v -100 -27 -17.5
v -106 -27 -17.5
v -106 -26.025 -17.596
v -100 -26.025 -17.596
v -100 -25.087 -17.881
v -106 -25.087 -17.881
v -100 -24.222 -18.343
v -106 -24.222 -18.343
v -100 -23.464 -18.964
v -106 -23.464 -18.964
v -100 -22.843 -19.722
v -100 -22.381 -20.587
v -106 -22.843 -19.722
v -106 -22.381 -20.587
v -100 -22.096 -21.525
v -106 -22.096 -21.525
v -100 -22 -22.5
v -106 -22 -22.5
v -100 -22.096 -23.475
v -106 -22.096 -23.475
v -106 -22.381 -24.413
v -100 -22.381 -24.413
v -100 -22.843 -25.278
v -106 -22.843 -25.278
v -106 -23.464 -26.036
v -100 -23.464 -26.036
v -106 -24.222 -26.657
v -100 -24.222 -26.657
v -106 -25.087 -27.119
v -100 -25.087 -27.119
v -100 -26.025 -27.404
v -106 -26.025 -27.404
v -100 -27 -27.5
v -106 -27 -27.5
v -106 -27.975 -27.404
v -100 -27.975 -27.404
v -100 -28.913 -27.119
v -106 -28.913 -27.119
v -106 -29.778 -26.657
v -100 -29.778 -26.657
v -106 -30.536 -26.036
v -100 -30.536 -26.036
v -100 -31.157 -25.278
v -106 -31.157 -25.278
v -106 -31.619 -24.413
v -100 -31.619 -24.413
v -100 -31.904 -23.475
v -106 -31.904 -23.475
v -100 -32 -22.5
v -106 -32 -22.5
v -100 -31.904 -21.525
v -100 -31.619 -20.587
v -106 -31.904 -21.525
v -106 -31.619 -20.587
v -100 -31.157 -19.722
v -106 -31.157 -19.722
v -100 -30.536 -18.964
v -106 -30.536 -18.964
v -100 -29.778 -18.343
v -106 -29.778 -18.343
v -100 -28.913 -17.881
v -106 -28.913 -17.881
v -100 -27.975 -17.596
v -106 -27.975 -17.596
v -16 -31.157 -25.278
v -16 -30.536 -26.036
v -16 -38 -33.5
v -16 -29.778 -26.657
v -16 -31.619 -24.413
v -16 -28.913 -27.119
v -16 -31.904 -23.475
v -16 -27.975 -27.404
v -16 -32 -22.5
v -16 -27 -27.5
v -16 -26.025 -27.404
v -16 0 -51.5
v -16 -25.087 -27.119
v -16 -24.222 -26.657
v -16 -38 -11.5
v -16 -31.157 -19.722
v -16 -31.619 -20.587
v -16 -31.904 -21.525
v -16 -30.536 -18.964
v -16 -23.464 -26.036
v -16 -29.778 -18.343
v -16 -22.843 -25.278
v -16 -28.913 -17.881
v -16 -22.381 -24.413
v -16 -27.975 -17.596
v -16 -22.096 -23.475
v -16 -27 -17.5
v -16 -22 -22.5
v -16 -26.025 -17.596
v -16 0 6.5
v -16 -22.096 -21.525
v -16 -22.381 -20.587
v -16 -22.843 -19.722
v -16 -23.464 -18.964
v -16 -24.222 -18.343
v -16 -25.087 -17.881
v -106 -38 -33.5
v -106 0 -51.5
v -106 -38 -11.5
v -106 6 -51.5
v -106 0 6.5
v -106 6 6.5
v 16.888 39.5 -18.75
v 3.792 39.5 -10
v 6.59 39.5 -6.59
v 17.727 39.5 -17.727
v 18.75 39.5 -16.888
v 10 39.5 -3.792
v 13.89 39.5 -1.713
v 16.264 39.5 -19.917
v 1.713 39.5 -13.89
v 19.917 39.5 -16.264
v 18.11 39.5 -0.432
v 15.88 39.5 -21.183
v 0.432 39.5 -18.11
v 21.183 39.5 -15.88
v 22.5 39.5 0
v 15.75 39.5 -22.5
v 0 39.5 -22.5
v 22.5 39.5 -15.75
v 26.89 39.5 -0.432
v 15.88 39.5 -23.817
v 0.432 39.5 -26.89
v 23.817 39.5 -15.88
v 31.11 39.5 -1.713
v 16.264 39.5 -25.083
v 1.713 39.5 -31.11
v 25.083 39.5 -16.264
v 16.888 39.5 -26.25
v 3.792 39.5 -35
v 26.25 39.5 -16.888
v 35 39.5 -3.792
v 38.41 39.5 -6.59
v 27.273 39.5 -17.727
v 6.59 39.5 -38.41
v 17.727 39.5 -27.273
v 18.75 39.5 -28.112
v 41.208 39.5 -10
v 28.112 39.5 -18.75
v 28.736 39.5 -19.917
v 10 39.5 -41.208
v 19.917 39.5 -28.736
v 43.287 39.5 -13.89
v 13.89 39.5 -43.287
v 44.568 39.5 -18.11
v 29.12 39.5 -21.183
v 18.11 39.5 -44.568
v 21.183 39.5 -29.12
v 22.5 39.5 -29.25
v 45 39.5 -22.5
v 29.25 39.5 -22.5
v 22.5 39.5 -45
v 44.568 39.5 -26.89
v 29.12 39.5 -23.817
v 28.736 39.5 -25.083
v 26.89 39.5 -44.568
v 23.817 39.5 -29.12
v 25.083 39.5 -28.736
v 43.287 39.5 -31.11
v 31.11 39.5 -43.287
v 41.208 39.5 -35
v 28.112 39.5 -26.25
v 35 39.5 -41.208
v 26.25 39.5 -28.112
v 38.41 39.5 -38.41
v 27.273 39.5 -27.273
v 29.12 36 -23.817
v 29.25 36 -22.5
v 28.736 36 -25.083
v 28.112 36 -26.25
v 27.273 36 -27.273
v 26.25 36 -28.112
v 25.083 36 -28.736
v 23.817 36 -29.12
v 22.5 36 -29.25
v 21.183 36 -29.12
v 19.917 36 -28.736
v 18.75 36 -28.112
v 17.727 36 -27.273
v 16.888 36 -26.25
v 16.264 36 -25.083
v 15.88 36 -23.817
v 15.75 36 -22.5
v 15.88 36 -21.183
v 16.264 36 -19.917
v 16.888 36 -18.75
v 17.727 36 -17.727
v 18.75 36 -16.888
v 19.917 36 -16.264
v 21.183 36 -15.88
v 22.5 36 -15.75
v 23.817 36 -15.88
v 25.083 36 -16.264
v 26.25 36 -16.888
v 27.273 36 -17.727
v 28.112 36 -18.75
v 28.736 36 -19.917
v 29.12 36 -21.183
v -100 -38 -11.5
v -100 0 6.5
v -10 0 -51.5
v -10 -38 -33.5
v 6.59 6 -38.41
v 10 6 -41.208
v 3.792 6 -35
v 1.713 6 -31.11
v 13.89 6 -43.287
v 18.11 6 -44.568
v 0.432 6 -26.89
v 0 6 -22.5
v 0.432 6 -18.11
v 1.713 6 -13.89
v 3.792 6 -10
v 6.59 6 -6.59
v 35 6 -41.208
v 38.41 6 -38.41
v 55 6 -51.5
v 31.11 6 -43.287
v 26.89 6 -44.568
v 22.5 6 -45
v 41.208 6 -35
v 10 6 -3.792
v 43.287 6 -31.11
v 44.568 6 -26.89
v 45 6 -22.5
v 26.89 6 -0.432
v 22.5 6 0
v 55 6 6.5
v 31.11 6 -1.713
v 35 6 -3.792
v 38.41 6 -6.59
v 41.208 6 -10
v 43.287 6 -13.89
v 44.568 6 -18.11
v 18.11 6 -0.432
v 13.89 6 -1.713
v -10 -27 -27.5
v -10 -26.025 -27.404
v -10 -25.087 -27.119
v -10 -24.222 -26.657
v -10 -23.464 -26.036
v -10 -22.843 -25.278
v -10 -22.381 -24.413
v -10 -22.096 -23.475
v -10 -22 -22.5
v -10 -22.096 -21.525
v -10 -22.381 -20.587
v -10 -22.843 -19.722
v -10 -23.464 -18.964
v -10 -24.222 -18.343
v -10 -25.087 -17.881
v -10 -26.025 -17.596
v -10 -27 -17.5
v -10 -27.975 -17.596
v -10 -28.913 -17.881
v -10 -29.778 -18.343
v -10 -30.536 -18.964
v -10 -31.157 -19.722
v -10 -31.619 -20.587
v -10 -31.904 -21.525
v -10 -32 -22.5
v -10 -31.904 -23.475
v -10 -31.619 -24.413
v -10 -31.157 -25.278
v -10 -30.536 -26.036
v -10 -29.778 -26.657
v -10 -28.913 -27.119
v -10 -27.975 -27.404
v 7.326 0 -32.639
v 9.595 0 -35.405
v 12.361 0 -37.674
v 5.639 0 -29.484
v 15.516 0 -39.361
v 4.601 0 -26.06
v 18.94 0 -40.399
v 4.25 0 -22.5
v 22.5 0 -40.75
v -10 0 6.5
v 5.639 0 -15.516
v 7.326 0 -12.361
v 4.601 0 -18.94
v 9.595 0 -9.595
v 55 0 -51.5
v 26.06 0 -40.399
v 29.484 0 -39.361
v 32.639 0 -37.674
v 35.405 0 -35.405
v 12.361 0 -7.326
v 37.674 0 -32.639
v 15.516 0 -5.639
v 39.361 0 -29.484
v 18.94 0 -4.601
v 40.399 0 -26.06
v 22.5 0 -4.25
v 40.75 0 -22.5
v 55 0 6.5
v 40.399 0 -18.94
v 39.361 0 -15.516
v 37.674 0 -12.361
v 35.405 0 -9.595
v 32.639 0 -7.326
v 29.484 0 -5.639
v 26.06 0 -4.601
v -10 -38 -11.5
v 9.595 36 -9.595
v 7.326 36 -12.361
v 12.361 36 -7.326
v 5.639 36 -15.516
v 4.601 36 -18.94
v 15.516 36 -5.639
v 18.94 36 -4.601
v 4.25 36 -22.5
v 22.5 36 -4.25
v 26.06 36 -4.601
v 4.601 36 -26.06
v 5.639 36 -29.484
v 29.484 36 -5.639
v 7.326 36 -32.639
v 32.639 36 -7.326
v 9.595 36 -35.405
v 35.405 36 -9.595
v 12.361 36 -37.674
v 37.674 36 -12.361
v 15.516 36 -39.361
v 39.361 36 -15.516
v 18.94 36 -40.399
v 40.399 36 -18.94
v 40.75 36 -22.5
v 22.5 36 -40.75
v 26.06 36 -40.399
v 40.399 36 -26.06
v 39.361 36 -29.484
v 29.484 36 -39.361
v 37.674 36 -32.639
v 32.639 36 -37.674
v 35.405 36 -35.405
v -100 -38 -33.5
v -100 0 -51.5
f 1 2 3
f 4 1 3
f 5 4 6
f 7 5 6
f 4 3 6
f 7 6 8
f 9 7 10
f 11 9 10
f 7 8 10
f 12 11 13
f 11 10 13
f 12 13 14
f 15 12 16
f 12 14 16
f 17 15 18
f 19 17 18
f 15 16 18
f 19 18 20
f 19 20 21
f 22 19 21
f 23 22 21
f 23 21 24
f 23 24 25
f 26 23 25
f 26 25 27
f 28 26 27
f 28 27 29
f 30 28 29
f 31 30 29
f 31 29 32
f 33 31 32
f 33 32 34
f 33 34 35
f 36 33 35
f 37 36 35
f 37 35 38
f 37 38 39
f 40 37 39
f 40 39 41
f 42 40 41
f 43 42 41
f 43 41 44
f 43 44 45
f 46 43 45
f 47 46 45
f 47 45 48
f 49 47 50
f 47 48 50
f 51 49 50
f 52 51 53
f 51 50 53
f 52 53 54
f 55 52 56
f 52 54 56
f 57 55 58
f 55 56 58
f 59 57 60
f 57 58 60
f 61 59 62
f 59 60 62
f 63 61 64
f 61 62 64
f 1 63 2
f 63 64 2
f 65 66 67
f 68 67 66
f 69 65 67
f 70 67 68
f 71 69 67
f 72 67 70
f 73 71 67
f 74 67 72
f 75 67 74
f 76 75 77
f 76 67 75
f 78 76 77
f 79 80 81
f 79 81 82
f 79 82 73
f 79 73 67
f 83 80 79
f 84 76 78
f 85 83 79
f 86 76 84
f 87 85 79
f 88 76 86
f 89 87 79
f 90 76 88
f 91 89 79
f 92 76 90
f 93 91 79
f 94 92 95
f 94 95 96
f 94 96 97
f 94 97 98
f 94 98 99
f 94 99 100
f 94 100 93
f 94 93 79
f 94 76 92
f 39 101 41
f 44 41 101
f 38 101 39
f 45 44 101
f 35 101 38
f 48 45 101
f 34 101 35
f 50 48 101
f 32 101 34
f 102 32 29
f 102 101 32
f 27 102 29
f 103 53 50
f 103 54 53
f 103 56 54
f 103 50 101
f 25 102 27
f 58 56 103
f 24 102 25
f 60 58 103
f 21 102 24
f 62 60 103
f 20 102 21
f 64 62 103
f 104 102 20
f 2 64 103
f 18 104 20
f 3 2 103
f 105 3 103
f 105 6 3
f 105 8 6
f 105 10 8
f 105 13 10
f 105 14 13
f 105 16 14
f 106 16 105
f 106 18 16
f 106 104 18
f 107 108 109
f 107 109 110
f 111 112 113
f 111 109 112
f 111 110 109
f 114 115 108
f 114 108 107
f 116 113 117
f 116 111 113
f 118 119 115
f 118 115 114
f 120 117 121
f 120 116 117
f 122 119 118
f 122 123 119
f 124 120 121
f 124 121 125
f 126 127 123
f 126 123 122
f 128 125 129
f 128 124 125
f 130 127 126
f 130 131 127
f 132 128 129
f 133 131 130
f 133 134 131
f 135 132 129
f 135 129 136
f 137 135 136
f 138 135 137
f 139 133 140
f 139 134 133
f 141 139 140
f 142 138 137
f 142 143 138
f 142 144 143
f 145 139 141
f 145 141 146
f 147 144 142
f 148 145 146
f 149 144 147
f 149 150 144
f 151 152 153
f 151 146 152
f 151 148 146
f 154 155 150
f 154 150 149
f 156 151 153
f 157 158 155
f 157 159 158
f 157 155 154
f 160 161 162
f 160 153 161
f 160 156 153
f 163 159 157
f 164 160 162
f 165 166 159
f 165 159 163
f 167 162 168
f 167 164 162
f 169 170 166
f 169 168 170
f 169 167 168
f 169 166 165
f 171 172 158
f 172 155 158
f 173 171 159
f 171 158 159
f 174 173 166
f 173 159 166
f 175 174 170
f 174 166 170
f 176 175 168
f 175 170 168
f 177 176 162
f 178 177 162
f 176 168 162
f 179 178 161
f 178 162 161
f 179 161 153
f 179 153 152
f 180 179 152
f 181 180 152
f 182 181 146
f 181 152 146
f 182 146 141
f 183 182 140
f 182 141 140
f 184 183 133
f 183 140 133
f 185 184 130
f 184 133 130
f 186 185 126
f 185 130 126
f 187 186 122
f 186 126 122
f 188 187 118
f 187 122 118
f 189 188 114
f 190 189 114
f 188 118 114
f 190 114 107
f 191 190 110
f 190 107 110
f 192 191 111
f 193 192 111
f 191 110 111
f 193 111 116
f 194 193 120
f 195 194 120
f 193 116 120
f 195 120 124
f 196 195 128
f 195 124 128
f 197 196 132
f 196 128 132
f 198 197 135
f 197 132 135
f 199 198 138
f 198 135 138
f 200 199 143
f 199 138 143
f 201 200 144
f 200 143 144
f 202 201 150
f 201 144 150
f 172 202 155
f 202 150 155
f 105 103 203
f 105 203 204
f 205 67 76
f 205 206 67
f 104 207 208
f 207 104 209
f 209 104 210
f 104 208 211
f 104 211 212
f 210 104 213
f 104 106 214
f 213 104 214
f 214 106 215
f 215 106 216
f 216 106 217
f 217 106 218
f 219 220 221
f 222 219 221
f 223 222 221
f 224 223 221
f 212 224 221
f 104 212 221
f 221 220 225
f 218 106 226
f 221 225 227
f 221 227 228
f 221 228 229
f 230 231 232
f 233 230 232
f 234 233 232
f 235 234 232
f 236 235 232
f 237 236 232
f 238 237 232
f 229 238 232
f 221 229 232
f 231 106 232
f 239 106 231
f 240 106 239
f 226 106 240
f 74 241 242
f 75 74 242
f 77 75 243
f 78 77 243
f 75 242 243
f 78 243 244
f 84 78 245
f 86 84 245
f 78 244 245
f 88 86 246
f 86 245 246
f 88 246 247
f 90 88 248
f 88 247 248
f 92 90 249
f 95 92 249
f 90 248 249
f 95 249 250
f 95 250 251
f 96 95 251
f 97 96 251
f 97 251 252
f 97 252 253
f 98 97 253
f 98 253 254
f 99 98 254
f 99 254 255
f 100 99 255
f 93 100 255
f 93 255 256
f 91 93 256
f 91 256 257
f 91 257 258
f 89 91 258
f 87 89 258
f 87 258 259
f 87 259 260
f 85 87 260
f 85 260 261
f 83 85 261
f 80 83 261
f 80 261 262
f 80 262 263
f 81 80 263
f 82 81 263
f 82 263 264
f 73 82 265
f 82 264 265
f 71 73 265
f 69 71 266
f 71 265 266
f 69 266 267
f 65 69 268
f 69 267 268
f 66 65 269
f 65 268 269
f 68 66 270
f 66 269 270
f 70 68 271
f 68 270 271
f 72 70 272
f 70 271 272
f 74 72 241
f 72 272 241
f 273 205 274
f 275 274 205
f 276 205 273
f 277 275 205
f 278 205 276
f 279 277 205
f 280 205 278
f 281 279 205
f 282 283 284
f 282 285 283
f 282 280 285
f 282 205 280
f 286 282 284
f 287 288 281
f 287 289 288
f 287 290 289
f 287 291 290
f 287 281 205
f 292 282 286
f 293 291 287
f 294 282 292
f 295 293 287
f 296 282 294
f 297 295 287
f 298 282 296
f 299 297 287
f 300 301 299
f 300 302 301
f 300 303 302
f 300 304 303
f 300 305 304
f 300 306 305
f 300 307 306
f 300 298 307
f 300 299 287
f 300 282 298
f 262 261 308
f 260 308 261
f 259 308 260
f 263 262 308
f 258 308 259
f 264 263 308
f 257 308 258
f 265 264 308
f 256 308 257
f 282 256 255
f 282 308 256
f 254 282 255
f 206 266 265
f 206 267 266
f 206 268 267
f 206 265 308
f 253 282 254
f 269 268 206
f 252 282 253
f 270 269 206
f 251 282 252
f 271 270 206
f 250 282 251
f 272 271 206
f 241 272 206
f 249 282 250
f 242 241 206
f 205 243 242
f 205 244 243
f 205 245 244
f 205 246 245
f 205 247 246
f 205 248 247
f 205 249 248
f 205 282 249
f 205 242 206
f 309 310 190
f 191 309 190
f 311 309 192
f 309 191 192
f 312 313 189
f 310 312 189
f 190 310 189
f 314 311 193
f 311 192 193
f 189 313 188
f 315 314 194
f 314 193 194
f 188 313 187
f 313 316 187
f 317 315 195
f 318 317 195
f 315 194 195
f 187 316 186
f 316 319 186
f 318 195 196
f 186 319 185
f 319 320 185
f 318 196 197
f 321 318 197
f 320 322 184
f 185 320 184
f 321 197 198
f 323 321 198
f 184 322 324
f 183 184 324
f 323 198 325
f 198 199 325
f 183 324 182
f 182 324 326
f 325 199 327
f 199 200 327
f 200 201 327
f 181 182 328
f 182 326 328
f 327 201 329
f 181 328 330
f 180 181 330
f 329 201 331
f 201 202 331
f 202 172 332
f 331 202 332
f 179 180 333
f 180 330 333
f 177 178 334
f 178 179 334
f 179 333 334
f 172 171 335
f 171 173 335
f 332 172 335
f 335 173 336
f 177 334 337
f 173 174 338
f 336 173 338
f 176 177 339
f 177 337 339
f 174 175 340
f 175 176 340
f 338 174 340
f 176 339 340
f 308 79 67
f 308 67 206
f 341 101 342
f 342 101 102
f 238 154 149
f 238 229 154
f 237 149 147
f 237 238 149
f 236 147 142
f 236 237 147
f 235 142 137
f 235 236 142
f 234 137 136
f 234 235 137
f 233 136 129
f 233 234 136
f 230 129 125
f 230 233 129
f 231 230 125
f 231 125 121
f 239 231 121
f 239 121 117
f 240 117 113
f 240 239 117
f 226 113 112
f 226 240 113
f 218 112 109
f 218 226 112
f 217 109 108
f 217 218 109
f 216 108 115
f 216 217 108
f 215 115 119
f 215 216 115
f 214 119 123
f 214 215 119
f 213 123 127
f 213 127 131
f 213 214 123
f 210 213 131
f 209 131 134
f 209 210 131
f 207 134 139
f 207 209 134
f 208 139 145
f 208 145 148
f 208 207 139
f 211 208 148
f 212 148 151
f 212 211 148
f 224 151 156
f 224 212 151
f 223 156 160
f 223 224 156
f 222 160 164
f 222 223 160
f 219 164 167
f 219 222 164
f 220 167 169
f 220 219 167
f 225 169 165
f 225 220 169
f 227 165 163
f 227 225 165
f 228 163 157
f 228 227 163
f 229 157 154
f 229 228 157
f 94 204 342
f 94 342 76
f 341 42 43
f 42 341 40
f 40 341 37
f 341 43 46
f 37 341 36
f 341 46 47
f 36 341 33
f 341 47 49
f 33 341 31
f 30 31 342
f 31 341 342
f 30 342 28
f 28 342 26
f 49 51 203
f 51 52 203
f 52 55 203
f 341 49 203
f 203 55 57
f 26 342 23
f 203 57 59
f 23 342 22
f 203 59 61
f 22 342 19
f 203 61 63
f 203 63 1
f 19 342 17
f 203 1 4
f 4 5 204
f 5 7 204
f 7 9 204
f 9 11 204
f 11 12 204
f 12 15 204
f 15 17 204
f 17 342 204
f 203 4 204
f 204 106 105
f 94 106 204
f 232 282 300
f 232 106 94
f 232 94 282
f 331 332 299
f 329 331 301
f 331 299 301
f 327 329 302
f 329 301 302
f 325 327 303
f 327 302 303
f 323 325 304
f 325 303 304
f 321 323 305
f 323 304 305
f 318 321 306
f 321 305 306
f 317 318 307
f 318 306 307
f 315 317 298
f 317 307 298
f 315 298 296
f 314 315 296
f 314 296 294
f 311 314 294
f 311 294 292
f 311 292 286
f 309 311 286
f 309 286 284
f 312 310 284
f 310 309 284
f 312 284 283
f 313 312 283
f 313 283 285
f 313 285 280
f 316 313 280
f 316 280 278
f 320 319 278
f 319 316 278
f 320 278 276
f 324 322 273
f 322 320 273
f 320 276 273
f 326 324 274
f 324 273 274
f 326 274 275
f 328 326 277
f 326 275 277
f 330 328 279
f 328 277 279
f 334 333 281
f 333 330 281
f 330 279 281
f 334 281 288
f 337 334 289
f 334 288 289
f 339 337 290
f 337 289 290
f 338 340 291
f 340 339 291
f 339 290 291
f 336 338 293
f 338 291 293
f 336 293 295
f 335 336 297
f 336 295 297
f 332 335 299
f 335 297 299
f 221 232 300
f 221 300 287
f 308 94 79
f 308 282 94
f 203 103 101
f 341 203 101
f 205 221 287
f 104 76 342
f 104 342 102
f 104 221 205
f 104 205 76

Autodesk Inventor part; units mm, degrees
ref_plane "YZ Plane" through (0, 0, 0) normal (1, 0, 0) x (0, 1, 0)
ref_plane "XZ Plane" through (0, 0, 0) normal (0, 1, 0) x (-1, 0, 0)
ref_plane "XY Plane" through (0, 0, 0) normal (0, 0, 1) x (1, 0, 0)
ref_plane "Work Plane3" through (0, 6, 0) normal (0, 1, 0) x (1, 0, 0)
sketch "Sketch2" plane through (0, 6, 0) normal (0, 1, 0) x (1, 0, 0)
  line L0 (0, 0) -> (0, 22.5)
  line L1 (0, 45) -> (0, 0) projected
  line L2 (0, 22.5) -> (22.5, 22.5)
  circle A0 centre (22.5, 22.5) radius 22.5
  dimension "d5" = 22.5
  dimension "d6" = 22.5
  dimension "d7" = 45
extrude "Extrusion2" add sketch "Sketch2" along normal blind 33.5
ref_plane "Work Plane2" through (0, 0, 0) normal (0, -1, 0) x (1, 0, 0)
sketch "Sketch3" plane through (0, 0, 0) normal (0, -1, 0) x (1, 0, 0)
  line L0 (0, -45) -> (0, 0) projected
  line L1 (0, 0) -> (0, -22.5)
  circle A0 centre (22.5, -22.5) radius 18.25
  dimension "d12" = 36.5
extrude "Extrusion3" cut sketch "Sketch3" against normal blind 65
sketch "Sketch4" plane through (22.5, 39.5, -22.5) normal (0, 1, 0) x (1, 0, 0)
  circle A0 centre (0, 0) radius 6.75
  point P0 (-22.5, -22.5)
  dimension "d15" = 13.5
extrude "Extrusion4" cut sketch "Sketch4" against normal blind 4.5
ref_plane "Work Plane1" through (0, 0, 0) normal (0, -1, 0) x (1, 0, 0)
sketch "Sketch5" plane through (0, 0, 0) normal (0, -1, 0) x (1, 0, 0)
  line L0 (0, -45) -> (0, 0) projected
  line L1 (0, 0) -> (22.5, 0)
  line L2 (0, 0) -> (45, 0) projected
sketch "Sketch6" plane through (22.5, 39.5, -22.5) normal (0, 1, 0) x (1, 0, 0)
  point P0 (-22.5, -22.5)
sketch "Sketch7" plane through (22.5, 39.5, -22.5) normal (0, 1, 0) x (1, 0, 0)
  circle A0 centre (0, 0) radius 18.25 projected
  circle A1 centre (0, 0) radius 18.25
  point P0 (-22.5, -22.5)
extrude "Extrusion5" add sketch "Sketch7" against normal blind 3.5
sketch "Sketch8" plane through (22.5, 39.5, -22.5) normal (0, 1, 0) x (1, 0, 0)
  circle A0 centre (0, 0) radius 6.75
  point P0 (-22.5, -22.5)
  dimension "d20" = 13.5
extrude "Extrusion6" cut sketch "Sketch8" against normal blind 3.5
sketch "Sketch9" plane through (22.5, 6, -22.5) normal (0, -1, 0) x (1, 0, 0)
  point P0 (-22.5, 22.5)
sketch "Sketch10" plane through (22.5, 39.5, -22.5) normal (0, 1, 0) x (1, 0, 0)
  point P0 (-22.5, -22.5)
sketch "Sketch11" plane through (22.5, 6, -22.5) normal (0, -1, 0) x (1, 0, 0)
  circle A0 centre (0, 0) radius 22.5 projected
  line L0 (0, 29) -> (32.5, 29)
  line L1 (32.5, 29) -> (32.5, -29)
  line L2 (32.5, -29) -> (-32.5, -29)
  line L3 (0, 29) -> (-32.5, 29)
  line L4 (-32.5, -29) -> (-128.5, -29)
  line L5 (-128.5, -29) -> (-128.5, 29)
  line L6 (-128.5, 29) -> (-32.5, 29)
  point P0 (-22.5, 22.5)
  dimension "d25" = 58
  dimension "d26" = 65
  dimension "d27" = 32.5
  dimension "d28" = 96
sketch "Sketch12" plane through (22.5, 6, -22.5) normal (0, -1, 0) x (1, 0, 0)
  point P0 (-22.5, 22.5)
extrude "Extrusion7" add sketch "Sketch11" along normal blind 6
sketch "Sketch13" plane through (22.5, 6, -22.5) normal (0, -1, 0) x (1, 0, 0)
  circle A0 centre (0, 0) radius 6.75 projected
  circle A1 centre (0, 0) radius 22.5
  point P0 (-22.5, 22.5)
extrude "Extrusion8" add sketch "Sketch13" along normal blind 6 contours A0 | A1
sketch "Sketch14" plane through (22.5, 0, -22.5) normal (0, -1, 0) x (1, 0, 0)
  circle A0 centre (0, 0) radius 18.25
  point P0 (-22.5, 22.5)
extrude "Extrusion9" cut sketch "Sketch14" against normal blind 6
sketch "Sketch15" plane through (-106, 6, -51.5) normal (-1, 0, 0) x (0, 0, 1)
  line L0 (58, -6) -> (0, -6) projected
  line L1 (29, -42) -> (38, -42)
  line L2 (29, -42) -> (20, -42)
  line L3 (20, -42) -> (0, -6)
  line L4 (38, -42) -> (58, -6)
  circle A0 centre (29, -33) radius 5
  point P0 (51.5, -6)
  dimension "d38" = 18
  dimension "d41" = 10
extrude "Extrusion10" add sketch "Sketch15" against normal blind 6
sketch "Sketch17" plane through (-106, -36, -31.5) normal (0, -1, 0) x (1, 0, 0)
  point P0 (106, 31.5)
sketch "Sketch18" plane through (-106, -36, -31.5) normal (0, -1, 0) x (1, 0, 0)
  line L0 (6, 18) -> (6, 0) projected
  line L1 (6, 18) -> (0, 18)
  line L2 (0, 38) -> (0, -20) projected
  line L3 (0, 0) -> (6, 0)
  line L4 (6, 0) -> (6, 18)
  line L5 (0, 18) -> (0, 0)
  point P0 (106, 31.5)
extrude "Extrusion12" add sketch "Sketch18" along normal blind 2
sketch "Sketch19" plane through (-106, 6, -51.5) normal (-1, 0, 0) x (0, 0, 1)
  line L0 (38, -42) -> (38, -44) projected
  line L1 (38, -44) -> (40, -44)
  line L2 (58, -44) -> (0, -44) projected
  line L3 (38, -42) -> (58, -6) projected
  line L4 (40, -44) -> (58, -6)
  line L5 (58, -6) -> (38, -42)
  line L6 (38, -42) -> (38, -44)
  line L7 (40, -44) -> (38, -44)
  point P0 (51.5, -6)
  dimension "d53" = 2
extrude "Extrusion13" add sketch "Sketch19" against normal blind 6
sketch "Sketch20" plane through (-106, 6, -51.5) normal (-1, 0, 0) x (0, 0, 1)
  line L0 (20, -42) -> (20, -44) projected
  line L1 (20, -44) -> (18, -44)
  line L2 (58, -44) -> (0, -44) projected
  line L3 (0, -6) -> (20, -42) projected
  line L4 (18, -44) -> (0, -6)
  line L5 (0, -6) -> (20, -42)
  line L6 (20, -42) -> (20, -44)
  line L7 (18, -44) -> (20, -44)
  point P0 (51.5, -6)
  dimension "d56" = 2
extrude "Extrusion14" add sketch "Sketch20" against normal blind 6
sketch "Sketch24" plane through (55, 6, -51.5) normal (0, 0, -1) x (-1, 0, 0)
  line L0 (155, -6) -> (0, -6) projected
  point P0 (55, -6)
  point P1 (61, -6)
sketch "Sketch25" plane through (22.5, 0, -22.5) normal (0, -1, 0) x (1, 0, 0)
  line L0 (-32.5, -29) -> (-38.5, -29)
  line L1 (-38.5, -29) -> (-38.5, 29)
  line L2 (32.5, 29) -> (-122.5, 29) projected
  line L3 (-38.5, 29) -> (-32.5, 29)
  line L4 (-32.5, 29) -> (-32.5, -29)
  point P0 (-22.5, 22.5)
  dimension "d71" = 6
  dimension "d72" = 6
extrude "Extrusion18" add sketch "Sketch25" along normal blind 38
sketch "Sketch26" plane through (-10, 0, 6.5) normal (1, 0, 0) x (0, 0, -1)
  line L0 (0, 0) -> (58, 0) projected
  circle A0 centre (29, -27) radius 5
  point P0 (6.5, 0)
  dimension "d76" = 10
sketch "Sketch27" plane through (-10, 0, 6.5) normal (1, 0, 0) x (0, 0, -1)
  point P0 (6.5, 0)
extrude "Extrusion19" cut sketch "Sketch26" against normal blind 6
sketch "Sketch28" plane through (-10, 0, 6.5) normal (1, 0, 0) x (0, 0, -1)
  circle A0 centre (29, -27) radius 5 projected
  line L0 (58, 0) -> (58, -38) projected
  line L1 (40, -38) -> (58, 0)
  line L2 (58, 0) -> (58, -38)
  line L3 (58, -38) -> (40, -38)
  point P0 (6.5, 0)
extrude "Extrusion20" cut sketch "Sketch28" against normal blind 6 contours L0 L3 L1
sketch "Sketch29" plane through (-10, -38, 6.5) normal (1, 0, 0) x (0, 0, -1)
  circle A0 centre (29, 11) radius 5 projected
  line L0 (0, 38) -> (18, 0) projected
  line L1 (18, 0) -> (0, 38)
  line L2 (0, 38) -> (0, 0) projected
  line L3 (0, 38) -> (0, 0)
  line L4 (0, 0) -> (18, 0)
  point P0 (6.5, 38)
extrude "Extrusion21" cut sketch "Sketch29" against normal blind 6 contours L0 L4 L2
sketch "Sketch30" plane through (55, 6, -51.5) normal (0, 0, -1) x (-1, 0, 0)
  point P0 (55, -6)
properties part number "angleadjuster"
